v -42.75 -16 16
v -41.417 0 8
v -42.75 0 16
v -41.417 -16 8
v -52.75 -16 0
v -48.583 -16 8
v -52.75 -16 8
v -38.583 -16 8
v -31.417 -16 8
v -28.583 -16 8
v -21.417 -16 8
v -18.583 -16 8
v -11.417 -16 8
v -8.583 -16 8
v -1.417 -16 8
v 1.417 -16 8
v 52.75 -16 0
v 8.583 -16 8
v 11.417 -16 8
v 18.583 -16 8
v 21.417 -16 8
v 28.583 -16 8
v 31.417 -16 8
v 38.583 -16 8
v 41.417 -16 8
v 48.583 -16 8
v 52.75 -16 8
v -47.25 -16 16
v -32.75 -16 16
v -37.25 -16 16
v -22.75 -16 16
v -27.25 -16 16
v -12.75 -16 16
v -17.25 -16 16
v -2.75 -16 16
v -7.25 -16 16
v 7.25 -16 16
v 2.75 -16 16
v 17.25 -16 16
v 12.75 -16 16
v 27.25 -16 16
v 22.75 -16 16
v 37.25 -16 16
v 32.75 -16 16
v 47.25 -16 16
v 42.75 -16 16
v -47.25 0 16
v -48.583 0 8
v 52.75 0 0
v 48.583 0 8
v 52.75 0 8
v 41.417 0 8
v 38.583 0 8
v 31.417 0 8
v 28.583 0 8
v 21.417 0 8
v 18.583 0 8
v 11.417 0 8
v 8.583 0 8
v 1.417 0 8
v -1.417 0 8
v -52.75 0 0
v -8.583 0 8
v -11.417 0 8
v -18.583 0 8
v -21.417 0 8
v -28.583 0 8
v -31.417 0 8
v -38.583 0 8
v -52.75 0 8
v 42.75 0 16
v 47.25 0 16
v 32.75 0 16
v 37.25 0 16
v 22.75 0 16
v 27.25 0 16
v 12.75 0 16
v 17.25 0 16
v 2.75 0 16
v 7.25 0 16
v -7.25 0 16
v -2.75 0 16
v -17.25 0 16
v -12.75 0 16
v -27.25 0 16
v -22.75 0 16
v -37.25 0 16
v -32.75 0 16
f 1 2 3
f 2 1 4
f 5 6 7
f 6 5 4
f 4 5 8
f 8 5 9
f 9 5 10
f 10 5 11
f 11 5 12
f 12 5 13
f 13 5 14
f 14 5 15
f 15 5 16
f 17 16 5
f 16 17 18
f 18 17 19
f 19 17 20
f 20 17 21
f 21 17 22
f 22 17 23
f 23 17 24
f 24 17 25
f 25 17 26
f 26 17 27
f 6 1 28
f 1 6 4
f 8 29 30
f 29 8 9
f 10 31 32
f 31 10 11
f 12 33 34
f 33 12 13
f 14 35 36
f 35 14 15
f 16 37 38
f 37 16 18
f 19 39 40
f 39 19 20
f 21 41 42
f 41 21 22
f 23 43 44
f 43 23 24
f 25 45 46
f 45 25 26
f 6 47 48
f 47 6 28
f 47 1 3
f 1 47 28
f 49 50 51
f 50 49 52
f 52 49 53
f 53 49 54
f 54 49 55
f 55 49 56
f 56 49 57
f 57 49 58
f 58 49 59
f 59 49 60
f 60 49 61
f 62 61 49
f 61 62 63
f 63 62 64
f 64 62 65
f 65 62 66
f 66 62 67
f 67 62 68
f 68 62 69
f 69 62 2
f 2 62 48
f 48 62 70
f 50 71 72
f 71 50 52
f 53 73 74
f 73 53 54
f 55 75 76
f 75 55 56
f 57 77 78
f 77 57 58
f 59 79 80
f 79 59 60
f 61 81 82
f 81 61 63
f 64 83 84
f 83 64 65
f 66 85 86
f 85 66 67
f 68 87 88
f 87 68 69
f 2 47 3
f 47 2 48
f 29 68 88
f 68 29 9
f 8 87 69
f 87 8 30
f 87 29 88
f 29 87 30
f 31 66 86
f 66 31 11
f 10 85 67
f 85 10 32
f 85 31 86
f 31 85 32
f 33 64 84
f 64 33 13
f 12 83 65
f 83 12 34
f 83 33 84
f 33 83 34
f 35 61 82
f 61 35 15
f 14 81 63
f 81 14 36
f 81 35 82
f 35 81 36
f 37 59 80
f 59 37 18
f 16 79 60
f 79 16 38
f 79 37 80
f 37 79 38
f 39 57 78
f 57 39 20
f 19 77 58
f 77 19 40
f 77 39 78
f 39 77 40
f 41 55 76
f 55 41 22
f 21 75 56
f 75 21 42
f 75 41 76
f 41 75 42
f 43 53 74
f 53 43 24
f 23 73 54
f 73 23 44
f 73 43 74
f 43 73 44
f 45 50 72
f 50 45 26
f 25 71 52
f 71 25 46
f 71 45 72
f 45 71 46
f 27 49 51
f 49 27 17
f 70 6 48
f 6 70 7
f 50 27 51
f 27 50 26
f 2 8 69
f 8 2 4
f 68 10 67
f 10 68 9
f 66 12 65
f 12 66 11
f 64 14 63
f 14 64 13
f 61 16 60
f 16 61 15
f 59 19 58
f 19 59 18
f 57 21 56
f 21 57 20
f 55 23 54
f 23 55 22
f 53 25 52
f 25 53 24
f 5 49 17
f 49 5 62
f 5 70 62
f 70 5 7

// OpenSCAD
$fn = 32;

// ----------------------------------------------------------------------
// Toothed rack, 10 teeth
// 10 mm pitch, 8 mm teeth
// ----------------------------------------------------------------------

// --- parameters (mm) ---
bar_w = 16;     // bar width (Y)
bar_h = 8;      // bar height (Z)
teeth = 10;     // number of teeth
pitch = 10;     // tooth pitch
tooth_h = 8;    // tooth height above the bar
root_w = 7.5;   // tooth width at the root
crest_w = 4.5;  // tooth width at the crest

// --- derived feature positions (mm) ---
span = (teeth - 1) * pitch;  // = 90   distance between the outer teeth
bar_l = span + root_w + 8;   // = 105.5   bar length: teeth plus 4 mm at each end
tooth_x = -span / 2;         // = -45   X of the first tooth
height = bar_h + tooth_h;    // = 16   overall height
feature_centers = [
  [tooth_x + 0 * pitch, -bar_w / 2],
  [tooth_x + 1 * pitch, -bar_w / 2],
  [tooth_x + 2 * pitch, -bar_w / 2],
  [tooth_x + 3 * pitch, -bar_w / 2],
  [tooth_x + 4 * pitch, -bar_w / 2],
  [tooth_x + 5 * pitch, -bar_w / 2],
  [tooth_x + 6 * pitch, -bar_w / 2],
  [tooth_x + 7 * pitch, -bar_w / 2],
  [tooth_x + 8 * pitch, -bar_w / 2],
  [tooth_x + 9 * pitch, -bar_w / 2]
];   // tooth centre line, drives the tooth loop

// bar with a rack of teeth, one extruded trapezoium per centre
module rack_tooth() {
  linear_extrude(height = bar_w)
    polygon(points = [
      [0, 0],
      [root_w, 0],
      [root_w / 2 + crest_w / 2, tooth_h + 1],
      [root_w / 2 - crest_w / 2, tooth_h + 1]
    ]);
}

union() {
  translate([-bar_l / 2, -bar_w, 0]) cube([bar_l, bar_w, bar_h]);
  for (centre = feature_centers)
    translate([centre[0] - root_w / 2, 0, bar_h - 1]) rotate([90, 0, 0]) rack_tooth();
}
